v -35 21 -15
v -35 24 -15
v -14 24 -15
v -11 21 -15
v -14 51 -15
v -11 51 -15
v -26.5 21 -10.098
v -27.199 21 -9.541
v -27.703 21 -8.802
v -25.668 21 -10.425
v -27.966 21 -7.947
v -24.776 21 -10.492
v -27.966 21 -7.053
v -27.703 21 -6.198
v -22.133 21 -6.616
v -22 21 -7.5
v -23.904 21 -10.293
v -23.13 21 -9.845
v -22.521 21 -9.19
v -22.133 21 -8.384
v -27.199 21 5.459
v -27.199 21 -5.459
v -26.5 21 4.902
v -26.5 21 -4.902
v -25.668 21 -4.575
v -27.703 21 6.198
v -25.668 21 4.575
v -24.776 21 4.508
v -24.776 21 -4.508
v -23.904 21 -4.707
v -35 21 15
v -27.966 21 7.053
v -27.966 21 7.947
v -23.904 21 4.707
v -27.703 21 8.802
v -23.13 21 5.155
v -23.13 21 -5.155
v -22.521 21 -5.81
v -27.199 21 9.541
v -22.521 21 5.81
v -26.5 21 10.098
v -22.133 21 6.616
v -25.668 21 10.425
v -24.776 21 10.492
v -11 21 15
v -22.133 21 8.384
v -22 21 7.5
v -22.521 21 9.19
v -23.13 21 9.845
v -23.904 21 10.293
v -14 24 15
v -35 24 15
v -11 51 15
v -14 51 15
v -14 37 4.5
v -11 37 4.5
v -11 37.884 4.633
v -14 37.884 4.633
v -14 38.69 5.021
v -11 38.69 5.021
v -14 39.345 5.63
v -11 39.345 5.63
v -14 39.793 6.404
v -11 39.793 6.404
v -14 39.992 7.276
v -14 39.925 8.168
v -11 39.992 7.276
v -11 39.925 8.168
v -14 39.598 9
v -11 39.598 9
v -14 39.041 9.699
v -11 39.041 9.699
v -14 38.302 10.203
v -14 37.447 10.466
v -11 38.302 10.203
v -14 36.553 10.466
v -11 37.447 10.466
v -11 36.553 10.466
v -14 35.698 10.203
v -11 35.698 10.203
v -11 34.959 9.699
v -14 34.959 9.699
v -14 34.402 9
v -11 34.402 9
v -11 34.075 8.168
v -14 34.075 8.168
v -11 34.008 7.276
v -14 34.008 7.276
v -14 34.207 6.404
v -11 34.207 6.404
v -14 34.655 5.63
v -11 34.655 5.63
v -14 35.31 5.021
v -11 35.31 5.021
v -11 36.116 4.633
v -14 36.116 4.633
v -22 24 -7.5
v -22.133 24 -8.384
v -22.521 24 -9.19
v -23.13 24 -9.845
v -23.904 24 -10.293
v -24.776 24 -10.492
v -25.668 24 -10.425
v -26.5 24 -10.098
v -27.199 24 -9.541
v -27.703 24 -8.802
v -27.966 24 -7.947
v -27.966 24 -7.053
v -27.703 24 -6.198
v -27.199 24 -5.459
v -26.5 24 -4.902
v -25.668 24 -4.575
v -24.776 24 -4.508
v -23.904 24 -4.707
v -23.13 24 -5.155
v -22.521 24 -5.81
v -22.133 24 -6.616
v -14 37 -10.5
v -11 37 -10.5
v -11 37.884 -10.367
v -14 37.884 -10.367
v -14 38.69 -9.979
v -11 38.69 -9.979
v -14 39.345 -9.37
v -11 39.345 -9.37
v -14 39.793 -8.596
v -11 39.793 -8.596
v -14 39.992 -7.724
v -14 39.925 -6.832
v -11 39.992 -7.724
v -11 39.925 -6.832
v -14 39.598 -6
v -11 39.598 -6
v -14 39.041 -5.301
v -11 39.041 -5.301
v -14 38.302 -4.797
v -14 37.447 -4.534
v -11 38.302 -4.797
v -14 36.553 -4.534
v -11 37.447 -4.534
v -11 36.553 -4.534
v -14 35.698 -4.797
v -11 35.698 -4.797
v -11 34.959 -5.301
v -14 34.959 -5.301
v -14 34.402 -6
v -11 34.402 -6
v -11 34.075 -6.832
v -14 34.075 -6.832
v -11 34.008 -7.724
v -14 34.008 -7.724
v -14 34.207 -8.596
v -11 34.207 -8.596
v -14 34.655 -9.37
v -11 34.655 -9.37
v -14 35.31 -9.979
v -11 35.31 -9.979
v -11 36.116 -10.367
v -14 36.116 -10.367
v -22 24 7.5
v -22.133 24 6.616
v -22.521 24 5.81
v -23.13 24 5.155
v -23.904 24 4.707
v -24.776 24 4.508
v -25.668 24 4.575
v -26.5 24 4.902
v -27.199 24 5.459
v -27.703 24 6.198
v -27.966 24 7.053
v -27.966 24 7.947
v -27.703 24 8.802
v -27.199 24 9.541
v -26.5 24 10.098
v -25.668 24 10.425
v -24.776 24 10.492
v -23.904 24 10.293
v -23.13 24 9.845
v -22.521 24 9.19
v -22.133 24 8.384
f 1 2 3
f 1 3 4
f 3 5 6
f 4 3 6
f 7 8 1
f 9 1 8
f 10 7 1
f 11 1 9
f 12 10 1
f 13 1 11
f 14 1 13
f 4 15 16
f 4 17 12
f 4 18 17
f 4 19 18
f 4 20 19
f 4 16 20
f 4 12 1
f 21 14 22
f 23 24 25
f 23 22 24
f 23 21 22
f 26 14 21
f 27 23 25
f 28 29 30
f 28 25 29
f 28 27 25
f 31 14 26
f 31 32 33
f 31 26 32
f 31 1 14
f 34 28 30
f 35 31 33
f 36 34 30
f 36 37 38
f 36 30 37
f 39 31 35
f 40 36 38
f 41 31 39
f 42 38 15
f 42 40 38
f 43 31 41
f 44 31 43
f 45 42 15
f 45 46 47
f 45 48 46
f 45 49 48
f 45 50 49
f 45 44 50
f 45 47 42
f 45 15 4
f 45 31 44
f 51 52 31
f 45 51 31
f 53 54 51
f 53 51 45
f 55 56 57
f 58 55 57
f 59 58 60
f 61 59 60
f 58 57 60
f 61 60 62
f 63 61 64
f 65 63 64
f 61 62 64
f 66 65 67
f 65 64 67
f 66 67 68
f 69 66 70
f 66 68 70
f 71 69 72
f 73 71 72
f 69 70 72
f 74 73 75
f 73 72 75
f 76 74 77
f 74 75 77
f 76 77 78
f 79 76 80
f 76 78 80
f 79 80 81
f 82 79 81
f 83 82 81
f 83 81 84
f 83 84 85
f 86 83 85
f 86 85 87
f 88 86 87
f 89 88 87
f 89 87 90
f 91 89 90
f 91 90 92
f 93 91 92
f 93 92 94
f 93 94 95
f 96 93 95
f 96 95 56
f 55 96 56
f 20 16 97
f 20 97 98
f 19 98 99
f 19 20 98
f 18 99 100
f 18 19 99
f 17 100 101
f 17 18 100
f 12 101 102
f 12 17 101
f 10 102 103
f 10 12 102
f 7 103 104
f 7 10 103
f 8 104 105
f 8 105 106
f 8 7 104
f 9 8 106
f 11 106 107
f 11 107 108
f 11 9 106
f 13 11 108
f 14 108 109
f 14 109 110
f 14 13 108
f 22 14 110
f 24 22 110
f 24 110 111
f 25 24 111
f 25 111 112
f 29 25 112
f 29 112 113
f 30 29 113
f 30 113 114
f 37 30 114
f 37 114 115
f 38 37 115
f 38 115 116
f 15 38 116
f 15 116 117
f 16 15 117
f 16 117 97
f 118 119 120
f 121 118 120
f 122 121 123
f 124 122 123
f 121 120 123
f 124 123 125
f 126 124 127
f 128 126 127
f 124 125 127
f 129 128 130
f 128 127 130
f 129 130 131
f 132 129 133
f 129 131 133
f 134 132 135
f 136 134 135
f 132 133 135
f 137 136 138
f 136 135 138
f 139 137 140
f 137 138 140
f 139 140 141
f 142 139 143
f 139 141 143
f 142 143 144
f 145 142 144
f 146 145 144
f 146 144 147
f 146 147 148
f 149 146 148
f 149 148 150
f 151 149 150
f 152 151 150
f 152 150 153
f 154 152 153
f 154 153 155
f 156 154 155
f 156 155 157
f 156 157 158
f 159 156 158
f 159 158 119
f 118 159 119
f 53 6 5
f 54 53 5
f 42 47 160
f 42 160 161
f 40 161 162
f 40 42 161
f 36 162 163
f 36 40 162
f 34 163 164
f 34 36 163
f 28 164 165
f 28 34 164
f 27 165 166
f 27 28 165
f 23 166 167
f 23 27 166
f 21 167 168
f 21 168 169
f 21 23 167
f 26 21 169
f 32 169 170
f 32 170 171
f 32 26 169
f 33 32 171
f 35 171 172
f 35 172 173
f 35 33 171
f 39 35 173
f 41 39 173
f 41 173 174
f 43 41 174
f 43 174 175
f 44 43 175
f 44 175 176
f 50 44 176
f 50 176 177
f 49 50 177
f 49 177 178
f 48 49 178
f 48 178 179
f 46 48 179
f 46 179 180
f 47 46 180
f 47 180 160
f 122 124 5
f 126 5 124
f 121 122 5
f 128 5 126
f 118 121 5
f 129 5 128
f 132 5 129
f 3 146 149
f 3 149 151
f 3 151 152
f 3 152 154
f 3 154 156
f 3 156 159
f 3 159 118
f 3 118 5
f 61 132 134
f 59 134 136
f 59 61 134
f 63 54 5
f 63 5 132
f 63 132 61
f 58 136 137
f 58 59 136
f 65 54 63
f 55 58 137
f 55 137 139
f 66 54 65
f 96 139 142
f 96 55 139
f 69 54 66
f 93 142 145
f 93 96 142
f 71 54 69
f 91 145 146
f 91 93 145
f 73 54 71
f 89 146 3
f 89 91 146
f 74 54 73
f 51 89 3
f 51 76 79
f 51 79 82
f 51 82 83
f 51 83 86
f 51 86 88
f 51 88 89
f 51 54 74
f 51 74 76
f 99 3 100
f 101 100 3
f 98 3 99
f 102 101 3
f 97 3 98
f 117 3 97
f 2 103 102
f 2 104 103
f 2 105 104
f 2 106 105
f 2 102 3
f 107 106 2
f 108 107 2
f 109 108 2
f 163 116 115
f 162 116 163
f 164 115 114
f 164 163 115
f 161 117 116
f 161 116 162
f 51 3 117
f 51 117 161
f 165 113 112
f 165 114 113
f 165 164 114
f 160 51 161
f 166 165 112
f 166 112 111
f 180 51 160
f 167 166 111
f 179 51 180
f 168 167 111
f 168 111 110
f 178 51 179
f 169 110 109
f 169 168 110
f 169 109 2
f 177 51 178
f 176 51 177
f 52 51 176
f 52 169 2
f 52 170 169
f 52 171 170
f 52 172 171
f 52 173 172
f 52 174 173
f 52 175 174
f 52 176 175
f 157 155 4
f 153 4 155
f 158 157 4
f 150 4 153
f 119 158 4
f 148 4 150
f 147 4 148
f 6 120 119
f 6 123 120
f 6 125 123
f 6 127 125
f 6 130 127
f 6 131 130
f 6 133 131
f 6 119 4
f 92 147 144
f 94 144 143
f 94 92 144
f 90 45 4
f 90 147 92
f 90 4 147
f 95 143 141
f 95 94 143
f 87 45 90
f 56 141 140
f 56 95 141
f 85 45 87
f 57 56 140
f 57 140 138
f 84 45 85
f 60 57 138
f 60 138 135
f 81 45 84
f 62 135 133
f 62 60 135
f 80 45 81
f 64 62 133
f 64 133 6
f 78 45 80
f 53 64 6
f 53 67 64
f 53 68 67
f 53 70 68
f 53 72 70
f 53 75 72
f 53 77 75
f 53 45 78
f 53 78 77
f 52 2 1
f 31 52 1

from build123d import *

# Parameters (mm, degrees)
AUFSATZ_LINEAR_AUSTRAGEN1_DEPTH      = 15
AUFSATZ_LINEAR_AUSTRAGEN1_DEPTH_BACK = 15
SKIZZE6_R                            = 3
SCHNITT_LINEAR_AUSTRAGEN1_DEPTH      = 14
SKIZZE8_R                            = 3
SCHNITT_LINEAR_AUSTRAGEN2_DEPTH      = 24


with BuildPart() as part:
    # Skizze3 → Aufsatz-Linear austragen1 (new body, two sides)
    with BuildSketch(Plane.XY) as aufsatz_linear_austragen1_sk:
        Polygon((-14, 24), (-35, 24), (-35, 21), (-11, 21), (-11, 51), (-14, 51), align=None)
    extrude(amount=AUFSATZ_LINEAR_AUSTRAGEN1_DEPTH)
    extrude(aufsatz_linear_austragen1_sk.sketch, amount=-AUFSATZ_LINEAR_AUSTRAGEN1_DEPTH_BACK)

    # Skizze6 → Schnitt-Linear austragen1 (cut)
    with BuildSketch(Plane(origin=(0, 0, 0), x_dir=(0, 0, -1), z_dir=(1, 0, 0))):
        with Locations((7.5, 37)):
            Circle(SKIZZE6_R)
        with Locations((-7.5, 37)):
            Circle(SKIZZE6_R)
    extrude(amount=-SCHNITT_LINEAR_AUSTRAGEN1_DEPTH, mode=Mode.SUBTRACT)

    # Skizze8 → Schnitt-Linear austragen2 (cut)
    with BuildSketch(Plane(origin=(0, 0, 0), x_dir=(1, 0, 0), z_dir=(0, 1, 0))):
        with Locations((-25, 7.5)):
            Circle(SKIZZE8_R)
        with Locations((-25, -7.5)):
            Circle(SKIZZE8_R)
    extrude(amount=SCHNITT_LINEAR_AUSTRAGEN2_DEPTH, mode=Mode.SUBTRACT)


solid = part.part
